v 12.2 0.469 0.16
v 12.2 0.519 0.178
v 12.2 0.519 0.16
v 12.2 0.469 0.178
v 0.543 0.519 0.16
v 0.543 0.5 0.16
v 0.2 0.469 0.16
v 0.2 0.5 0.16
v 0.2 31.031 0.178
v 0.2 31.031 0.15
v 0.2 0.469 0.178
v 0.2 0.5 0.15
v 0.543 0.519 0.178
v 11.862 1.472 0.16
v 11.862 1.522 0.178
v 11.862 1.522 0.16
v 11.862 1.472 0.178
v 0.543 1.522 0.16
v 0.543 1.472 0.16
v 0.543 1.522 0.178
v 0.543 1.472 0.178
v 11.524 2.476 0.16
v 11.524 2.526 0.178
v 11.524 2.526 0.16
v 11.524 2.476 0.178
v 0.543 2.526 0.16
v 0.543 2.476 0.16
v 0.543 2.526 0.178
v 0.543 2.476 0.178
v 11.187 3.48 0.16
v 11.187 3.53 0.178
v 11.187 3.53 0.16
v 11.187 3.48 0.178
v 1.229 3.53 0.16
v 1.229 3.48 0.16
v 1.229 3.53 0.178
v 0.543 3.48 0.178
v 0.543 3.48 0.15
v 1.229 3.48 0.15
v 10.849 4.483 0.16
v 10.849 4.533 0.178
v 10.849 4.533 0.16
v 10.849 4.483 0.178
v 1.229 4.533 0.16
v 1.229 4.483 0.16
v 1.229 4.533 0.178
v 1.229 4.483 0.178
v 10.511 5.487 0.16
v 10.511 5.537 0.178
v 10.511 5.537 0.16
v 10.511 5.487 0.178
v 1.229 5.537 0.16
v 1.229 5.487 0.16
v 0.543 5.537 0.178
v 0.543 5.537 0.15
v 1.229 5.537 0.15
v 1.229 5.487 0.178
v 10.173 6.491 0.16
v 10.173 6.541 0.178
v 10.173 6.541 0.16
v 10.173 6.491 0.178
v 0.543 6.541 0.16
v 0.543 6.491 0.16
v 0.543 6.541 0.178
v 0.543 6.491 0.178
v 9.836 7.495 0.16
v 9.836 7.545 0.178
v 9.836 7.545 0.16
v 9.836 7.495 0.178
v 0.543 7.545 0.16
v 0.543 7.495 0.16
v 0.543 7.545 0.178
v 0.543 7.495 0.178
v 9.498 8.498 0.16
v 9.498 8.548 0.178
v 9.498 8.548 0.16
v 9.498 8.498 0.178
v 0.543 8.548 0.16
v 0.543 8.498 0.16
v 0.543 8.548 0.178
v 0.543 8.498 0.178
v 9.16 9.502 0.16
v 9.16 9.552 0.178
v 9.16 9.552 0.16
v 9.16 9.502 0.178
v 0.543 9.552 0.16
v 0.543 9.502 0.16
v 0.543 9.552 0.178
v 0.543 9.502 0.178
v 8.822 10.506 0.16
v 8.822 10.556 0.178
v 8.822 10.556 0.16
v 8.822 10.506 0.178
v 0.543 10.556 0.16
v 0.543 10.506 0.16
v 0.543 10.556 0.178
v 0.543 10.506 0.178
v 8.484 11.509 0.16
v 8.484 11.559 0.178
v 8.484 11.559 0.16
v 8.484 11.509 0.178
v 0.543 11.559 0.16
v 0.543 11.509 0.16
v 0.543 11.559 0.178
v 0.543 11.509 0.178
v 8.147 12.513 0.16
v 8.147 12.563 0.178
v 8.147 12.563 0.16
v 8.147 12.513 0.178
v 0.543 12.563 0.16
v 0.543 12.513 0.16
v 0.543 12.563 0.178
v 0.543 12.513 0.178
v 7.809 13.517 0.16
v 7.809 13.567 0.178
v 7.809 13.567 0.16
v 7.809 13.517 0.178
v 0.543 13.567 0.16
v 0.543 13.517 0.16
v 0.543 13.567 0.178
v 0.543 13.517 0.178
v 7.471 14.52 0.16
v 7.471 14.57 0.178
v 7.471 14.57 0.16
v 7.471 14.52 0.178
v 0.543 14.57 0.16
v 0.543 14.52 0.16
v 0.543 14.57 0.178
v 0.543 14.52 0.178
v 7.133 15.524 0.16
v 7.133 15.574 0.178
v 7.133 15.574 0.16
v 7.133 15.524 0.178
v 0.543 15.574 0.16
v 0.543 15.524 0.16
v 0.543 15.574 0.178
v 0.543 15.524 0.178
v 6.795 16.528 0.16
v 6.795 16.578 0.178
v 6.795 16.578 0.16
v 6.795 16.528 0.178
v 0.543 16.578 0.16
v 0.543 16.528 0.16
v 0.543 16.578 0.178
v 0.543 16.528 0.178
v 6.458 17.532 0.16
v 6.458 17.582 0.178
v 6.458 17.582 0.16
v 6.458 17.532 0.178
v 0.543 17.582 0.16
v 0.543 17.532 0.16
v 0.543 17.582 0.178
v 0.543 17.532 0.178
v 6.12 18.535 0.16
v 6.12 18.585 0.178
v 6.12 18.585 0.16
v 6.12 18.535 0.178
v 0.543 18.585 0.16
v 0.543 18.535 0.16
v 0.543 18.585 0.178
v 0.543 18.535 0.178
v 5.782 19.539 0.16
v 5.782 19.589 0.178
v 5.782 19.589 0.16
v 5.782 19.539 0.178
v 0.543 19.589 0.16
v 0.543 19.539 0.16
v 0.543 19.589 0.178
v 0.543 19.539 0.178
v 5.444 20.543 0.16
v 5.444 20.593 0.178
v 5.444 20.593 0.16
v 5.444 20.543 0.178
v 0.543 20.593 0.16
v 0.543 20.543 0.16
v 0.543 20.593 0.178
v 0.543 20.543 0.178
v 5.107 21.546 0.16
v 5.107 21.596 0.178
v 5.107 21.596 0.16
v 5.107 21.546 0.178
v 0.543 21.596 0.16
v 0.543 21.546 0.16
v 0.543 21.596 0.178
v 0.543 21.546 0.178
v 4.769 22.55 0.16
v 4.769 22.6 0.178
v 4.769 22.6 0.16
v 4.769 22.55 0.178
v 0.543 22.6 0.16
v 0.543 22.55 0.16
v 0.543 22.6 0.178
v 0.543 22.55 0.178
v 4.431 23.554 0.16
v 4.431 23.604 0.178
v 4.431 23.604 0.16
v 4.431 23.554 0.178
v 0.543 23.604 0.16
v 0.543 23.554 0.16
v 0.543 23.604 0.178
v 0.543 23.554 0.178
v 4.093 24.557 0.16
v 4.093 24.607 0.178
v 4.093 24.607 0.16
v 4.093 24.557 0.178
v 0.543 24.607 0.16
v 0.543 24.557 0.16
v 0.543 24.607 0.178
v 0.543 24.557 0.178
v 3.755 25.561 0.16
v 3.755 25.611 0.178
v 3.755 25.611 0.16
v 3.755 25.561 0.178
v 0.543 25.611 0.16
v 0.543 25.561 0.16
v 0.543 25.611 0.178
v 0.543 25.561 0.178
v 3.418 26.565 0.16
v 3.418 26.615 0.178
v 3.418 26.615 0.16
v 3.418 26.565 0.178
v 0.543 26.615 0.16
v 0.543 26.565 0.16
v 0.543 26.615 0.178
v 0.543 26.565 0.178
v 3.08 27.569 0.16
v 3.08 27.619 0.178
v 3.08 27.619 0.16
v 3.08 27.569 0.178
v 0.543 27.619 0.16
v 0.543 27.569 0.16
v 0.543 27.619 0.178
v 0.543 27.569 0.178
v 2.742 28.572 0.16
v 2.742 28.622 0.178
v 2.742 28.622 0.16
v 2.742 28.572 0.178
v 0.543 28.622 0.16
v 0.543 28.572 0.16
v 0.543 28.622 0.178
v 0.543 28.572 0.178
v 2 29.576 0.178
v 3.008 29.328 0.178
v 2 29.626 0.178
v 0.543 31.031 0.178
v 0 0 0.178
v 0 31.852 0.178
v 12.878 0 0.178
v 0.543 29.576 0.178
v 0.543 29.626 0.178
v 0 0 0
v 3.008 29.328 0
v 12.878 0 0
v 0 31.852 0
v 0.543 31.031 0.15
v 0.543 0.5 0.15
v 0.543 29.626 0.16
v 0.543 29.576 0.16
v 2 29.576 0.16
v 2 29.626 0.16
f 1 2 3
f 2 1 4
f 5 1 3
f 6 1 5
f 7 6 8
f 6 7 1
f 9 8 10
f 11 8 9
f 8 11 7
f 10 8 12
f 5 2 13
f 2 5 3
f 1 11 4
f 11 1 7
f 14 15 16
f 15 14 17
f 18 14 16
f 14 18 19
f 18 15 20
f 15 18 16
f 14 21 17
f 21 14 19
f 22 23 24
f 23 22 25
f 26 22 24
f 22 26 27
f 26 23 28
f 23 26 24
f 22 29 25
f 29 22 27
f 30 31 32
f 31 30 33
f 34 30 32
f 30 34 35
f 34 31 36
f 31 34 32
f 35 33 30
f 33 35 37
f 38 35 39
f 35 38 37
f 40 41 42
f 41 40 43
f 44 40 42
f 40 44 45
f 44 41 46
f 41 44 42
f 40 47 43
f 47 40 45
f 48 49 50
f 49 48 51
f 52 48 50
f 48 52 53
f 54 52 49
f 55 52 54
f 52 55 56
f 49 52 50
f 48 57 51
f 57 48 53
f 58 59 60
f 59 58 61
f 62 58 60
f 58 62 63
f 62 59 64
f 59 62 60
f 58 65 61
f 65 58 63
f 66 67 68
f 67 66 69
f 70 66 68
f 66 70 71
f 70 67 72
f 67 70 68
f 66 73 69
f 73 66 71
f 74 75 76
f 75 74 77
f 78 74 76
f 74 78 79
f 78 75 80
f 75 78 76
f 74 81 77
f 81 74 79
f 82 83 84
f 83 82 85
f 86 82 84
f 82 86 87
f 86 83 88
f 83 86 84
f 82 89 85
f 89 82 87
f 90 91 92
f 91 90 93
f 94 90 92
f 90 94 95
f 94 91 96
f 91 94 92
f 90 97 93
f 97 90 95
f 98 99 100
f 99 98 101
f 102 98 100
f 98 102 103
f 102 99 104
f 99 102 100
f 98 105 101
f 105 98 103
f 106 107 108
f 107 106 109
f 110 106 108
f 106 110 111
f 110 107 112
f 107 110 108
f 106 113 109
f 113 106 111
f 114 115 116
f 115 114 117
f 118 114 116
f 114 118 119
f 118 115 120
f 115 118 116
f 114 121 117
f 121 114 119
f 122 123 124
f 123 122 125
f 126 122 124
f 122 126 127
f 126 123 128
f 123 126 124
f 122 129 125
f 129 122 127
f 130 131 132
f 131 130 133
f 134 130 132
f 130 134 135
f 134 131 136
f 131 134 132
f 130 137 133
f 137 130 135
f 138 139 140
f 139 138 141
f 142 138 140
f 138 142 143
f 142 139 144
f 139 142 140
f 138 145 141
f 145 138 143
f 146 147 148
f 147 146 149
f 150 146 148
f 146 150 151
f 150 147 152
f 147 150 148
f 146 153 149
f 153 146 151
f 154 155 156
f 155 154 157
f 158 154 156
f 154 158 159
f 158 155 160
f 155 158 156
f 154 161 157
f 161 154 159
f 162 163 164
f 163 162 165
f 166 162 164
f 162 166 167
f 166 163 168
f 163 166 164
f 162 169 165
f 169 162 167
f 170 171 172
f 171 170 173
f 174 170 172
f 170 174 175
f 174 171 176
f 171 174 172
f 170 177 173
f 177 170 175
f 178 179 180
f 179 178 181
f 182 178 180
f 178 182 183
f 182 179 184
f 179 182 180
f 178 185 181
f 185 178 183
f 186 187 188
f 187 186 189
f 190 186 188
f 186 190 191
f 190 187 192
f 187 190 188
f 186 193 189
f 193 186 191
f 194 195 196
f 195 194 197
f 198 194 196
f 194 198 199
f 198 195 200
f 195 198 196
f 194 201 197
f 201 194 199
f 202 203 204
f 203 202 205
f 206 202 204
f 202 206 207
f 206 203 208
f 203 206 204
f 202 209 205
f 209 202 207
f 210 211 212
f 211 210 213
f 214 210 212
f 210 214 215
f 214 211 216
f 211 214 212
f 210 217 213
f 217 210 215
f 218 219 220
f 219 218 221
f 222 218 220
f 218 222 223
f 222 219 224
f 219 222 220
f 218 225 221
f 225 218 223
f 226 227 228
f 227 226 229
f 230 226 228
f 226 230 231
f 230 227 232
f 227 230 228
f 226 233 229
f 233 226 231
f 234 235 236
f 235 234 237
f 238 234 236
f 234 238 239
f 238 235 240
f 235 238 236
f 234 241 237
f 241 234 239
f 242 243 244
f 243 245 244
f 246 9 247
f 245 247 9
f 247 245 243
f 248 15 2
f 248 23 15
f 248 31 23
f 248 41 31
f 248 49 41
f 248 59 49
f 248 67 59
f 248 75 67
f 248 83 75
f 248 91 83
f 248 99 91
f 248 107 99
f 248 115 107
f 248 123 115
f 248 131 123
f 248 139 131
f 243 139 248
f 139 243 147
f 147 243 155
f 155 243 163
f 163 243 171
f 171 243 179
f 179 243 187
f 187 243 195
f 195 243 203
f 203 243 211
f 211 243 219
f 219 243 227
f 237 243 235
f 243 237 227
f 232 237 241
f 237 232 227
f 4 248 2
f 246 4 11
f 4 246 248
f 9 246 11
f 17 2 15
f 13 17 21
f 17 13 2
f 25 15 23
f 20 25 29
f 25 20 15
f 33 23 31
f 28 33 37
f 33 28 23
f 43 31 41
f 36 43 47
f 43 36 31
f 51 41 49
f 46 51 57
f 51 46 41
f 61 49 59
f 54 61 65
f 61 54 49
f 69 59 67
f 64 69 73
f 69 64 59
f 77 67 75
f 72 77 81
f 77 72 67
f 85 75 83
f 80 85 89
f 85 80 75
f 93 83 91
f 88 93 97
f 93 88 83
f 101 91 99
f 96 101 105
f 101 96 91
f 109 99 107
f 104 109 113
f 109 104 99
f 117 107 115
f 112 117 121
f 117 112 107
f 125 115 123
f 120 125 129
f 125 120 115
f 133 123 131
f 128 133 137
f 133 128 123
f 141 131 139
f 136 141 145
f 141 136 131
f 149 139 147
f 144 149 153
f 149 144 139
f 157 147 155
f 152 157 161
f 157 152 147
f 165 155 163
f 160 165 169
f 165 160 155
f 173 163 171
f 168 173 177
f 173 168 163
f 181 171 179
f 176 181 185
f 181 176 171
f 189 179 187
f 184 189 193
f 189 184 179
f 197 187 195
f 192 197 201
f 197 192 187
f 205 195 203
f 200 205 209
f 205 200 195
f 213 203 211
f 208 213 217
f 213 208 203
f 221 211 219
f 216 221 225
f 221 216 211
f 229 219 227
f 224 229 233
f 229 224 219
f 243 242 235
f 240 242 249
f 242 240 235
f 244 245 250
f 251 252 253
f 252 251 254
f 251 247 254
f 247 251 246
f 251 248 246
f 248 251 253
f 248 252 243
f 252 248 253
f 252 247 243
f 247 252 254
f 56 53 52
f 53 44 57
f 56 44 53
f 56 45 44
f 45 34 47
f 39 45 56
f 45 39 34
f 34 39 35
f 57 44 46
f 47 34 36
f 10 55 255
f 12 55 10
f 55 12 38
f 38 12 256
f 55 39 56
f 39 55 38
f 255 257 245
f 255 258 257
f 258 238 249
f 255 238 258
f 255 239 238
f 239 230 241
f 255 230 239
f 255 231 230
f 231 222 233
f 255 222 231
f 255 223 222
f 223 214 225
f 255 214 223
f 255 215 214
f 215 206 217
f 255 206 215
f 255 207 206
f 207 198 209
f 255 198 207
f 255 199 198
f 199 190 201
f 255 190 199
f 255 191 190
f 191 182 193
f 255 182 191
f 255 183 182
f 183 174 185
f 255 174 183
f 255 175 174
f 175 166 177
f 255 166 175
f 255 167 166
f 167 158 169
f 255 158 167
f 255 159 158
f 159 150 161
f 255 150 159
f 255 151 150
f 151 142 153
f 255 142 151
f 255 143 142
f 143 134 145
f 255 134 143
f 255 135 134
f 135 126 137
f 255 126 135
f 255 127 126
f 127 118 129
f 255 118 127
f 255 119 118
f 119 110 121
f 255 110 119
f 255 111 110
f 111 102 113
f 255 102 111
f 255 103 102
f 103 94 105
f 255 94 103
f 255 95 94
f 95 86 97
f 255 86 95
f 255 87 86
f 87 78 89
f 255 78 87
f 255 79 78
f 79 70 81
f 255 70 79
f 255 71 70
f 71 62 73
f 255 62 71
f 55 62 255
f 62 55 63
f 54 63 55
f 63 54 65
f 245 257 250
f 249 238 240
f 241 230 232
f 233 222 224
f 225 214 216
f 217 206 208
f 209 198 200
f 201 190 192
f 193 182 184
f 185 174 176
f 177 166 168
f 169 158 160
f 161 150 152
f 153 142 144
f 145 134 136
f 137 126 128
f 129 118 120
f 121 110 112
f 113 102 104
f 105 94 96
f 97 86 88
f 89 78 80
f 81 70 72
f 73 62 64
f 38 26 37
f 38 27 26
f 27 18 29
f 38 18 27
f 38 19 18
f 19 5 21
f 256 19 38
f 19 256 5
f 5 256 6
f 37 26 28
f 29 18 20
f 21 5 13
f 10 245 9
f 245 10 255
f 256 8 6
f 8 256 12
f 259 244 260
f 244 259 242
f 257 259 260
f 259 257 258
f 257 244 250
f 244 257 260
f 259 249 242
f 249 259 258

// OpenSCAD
/*
 * Creates a TASC Cell.
 *
 * Author: Ian McInerney
 * Created: July 1, 2013
 */



difference() {
        cube(size=[12.8778,31.8516,0.1778],center=false);
        
        // Make the semi-triangular shape
        translate([12.8778,0.0,-0.2])rotate([0.0,0.0,18.6])cube(size=[12.0,40.37442,0.4], center=false);
        translate([0.0,31.8516,-0.2])rotate([0.0,0.0,-40.0])cube([12.0,12.0,0.4], center=false);

        // Make the terminals on the top of the cell
        translate([0.2,3.4798,0.15])cube(size=[1.0287,2.0574,1.0], center=false);
        translate([0.2,0.5,0.15])cube(size=[0.3429,30.5308,1.0], center=false);


//        translate([0.2,0.4687,0.16])cube(size=[12.5,0.05,1.0], center=false);
//        translate([0.2,1.4724,0.16])cube(size=[12.0,0.05,1.0], center=false);
//        translate([0.2,2.4761,0.16])cube(size=[11.5,0.05,1.0], center=false);
//        translate([0.2,3.4798,0.16])cube(size=[11.0,0.05,1.0], center=false);
//        translate([0.2,4.4835,0.16])cube(size=[10.5,0.05,1.0], center=false);
//        translate([0.2,5.4872,0.16])cube(size=[10.0,0.05,1.0], center=false);

        for (i=[0:1:28]) {
                translate([0.2,i*1.0037+0.4687,0.16])cube(size=[12.0-i*0.3377823,0.05,1.0], center=false);
        }
        translate([0.2,29*1.0037+0.4687,0.16])cube(size=[1.8,0.05,1.0], center=false);
}

//1.0037
